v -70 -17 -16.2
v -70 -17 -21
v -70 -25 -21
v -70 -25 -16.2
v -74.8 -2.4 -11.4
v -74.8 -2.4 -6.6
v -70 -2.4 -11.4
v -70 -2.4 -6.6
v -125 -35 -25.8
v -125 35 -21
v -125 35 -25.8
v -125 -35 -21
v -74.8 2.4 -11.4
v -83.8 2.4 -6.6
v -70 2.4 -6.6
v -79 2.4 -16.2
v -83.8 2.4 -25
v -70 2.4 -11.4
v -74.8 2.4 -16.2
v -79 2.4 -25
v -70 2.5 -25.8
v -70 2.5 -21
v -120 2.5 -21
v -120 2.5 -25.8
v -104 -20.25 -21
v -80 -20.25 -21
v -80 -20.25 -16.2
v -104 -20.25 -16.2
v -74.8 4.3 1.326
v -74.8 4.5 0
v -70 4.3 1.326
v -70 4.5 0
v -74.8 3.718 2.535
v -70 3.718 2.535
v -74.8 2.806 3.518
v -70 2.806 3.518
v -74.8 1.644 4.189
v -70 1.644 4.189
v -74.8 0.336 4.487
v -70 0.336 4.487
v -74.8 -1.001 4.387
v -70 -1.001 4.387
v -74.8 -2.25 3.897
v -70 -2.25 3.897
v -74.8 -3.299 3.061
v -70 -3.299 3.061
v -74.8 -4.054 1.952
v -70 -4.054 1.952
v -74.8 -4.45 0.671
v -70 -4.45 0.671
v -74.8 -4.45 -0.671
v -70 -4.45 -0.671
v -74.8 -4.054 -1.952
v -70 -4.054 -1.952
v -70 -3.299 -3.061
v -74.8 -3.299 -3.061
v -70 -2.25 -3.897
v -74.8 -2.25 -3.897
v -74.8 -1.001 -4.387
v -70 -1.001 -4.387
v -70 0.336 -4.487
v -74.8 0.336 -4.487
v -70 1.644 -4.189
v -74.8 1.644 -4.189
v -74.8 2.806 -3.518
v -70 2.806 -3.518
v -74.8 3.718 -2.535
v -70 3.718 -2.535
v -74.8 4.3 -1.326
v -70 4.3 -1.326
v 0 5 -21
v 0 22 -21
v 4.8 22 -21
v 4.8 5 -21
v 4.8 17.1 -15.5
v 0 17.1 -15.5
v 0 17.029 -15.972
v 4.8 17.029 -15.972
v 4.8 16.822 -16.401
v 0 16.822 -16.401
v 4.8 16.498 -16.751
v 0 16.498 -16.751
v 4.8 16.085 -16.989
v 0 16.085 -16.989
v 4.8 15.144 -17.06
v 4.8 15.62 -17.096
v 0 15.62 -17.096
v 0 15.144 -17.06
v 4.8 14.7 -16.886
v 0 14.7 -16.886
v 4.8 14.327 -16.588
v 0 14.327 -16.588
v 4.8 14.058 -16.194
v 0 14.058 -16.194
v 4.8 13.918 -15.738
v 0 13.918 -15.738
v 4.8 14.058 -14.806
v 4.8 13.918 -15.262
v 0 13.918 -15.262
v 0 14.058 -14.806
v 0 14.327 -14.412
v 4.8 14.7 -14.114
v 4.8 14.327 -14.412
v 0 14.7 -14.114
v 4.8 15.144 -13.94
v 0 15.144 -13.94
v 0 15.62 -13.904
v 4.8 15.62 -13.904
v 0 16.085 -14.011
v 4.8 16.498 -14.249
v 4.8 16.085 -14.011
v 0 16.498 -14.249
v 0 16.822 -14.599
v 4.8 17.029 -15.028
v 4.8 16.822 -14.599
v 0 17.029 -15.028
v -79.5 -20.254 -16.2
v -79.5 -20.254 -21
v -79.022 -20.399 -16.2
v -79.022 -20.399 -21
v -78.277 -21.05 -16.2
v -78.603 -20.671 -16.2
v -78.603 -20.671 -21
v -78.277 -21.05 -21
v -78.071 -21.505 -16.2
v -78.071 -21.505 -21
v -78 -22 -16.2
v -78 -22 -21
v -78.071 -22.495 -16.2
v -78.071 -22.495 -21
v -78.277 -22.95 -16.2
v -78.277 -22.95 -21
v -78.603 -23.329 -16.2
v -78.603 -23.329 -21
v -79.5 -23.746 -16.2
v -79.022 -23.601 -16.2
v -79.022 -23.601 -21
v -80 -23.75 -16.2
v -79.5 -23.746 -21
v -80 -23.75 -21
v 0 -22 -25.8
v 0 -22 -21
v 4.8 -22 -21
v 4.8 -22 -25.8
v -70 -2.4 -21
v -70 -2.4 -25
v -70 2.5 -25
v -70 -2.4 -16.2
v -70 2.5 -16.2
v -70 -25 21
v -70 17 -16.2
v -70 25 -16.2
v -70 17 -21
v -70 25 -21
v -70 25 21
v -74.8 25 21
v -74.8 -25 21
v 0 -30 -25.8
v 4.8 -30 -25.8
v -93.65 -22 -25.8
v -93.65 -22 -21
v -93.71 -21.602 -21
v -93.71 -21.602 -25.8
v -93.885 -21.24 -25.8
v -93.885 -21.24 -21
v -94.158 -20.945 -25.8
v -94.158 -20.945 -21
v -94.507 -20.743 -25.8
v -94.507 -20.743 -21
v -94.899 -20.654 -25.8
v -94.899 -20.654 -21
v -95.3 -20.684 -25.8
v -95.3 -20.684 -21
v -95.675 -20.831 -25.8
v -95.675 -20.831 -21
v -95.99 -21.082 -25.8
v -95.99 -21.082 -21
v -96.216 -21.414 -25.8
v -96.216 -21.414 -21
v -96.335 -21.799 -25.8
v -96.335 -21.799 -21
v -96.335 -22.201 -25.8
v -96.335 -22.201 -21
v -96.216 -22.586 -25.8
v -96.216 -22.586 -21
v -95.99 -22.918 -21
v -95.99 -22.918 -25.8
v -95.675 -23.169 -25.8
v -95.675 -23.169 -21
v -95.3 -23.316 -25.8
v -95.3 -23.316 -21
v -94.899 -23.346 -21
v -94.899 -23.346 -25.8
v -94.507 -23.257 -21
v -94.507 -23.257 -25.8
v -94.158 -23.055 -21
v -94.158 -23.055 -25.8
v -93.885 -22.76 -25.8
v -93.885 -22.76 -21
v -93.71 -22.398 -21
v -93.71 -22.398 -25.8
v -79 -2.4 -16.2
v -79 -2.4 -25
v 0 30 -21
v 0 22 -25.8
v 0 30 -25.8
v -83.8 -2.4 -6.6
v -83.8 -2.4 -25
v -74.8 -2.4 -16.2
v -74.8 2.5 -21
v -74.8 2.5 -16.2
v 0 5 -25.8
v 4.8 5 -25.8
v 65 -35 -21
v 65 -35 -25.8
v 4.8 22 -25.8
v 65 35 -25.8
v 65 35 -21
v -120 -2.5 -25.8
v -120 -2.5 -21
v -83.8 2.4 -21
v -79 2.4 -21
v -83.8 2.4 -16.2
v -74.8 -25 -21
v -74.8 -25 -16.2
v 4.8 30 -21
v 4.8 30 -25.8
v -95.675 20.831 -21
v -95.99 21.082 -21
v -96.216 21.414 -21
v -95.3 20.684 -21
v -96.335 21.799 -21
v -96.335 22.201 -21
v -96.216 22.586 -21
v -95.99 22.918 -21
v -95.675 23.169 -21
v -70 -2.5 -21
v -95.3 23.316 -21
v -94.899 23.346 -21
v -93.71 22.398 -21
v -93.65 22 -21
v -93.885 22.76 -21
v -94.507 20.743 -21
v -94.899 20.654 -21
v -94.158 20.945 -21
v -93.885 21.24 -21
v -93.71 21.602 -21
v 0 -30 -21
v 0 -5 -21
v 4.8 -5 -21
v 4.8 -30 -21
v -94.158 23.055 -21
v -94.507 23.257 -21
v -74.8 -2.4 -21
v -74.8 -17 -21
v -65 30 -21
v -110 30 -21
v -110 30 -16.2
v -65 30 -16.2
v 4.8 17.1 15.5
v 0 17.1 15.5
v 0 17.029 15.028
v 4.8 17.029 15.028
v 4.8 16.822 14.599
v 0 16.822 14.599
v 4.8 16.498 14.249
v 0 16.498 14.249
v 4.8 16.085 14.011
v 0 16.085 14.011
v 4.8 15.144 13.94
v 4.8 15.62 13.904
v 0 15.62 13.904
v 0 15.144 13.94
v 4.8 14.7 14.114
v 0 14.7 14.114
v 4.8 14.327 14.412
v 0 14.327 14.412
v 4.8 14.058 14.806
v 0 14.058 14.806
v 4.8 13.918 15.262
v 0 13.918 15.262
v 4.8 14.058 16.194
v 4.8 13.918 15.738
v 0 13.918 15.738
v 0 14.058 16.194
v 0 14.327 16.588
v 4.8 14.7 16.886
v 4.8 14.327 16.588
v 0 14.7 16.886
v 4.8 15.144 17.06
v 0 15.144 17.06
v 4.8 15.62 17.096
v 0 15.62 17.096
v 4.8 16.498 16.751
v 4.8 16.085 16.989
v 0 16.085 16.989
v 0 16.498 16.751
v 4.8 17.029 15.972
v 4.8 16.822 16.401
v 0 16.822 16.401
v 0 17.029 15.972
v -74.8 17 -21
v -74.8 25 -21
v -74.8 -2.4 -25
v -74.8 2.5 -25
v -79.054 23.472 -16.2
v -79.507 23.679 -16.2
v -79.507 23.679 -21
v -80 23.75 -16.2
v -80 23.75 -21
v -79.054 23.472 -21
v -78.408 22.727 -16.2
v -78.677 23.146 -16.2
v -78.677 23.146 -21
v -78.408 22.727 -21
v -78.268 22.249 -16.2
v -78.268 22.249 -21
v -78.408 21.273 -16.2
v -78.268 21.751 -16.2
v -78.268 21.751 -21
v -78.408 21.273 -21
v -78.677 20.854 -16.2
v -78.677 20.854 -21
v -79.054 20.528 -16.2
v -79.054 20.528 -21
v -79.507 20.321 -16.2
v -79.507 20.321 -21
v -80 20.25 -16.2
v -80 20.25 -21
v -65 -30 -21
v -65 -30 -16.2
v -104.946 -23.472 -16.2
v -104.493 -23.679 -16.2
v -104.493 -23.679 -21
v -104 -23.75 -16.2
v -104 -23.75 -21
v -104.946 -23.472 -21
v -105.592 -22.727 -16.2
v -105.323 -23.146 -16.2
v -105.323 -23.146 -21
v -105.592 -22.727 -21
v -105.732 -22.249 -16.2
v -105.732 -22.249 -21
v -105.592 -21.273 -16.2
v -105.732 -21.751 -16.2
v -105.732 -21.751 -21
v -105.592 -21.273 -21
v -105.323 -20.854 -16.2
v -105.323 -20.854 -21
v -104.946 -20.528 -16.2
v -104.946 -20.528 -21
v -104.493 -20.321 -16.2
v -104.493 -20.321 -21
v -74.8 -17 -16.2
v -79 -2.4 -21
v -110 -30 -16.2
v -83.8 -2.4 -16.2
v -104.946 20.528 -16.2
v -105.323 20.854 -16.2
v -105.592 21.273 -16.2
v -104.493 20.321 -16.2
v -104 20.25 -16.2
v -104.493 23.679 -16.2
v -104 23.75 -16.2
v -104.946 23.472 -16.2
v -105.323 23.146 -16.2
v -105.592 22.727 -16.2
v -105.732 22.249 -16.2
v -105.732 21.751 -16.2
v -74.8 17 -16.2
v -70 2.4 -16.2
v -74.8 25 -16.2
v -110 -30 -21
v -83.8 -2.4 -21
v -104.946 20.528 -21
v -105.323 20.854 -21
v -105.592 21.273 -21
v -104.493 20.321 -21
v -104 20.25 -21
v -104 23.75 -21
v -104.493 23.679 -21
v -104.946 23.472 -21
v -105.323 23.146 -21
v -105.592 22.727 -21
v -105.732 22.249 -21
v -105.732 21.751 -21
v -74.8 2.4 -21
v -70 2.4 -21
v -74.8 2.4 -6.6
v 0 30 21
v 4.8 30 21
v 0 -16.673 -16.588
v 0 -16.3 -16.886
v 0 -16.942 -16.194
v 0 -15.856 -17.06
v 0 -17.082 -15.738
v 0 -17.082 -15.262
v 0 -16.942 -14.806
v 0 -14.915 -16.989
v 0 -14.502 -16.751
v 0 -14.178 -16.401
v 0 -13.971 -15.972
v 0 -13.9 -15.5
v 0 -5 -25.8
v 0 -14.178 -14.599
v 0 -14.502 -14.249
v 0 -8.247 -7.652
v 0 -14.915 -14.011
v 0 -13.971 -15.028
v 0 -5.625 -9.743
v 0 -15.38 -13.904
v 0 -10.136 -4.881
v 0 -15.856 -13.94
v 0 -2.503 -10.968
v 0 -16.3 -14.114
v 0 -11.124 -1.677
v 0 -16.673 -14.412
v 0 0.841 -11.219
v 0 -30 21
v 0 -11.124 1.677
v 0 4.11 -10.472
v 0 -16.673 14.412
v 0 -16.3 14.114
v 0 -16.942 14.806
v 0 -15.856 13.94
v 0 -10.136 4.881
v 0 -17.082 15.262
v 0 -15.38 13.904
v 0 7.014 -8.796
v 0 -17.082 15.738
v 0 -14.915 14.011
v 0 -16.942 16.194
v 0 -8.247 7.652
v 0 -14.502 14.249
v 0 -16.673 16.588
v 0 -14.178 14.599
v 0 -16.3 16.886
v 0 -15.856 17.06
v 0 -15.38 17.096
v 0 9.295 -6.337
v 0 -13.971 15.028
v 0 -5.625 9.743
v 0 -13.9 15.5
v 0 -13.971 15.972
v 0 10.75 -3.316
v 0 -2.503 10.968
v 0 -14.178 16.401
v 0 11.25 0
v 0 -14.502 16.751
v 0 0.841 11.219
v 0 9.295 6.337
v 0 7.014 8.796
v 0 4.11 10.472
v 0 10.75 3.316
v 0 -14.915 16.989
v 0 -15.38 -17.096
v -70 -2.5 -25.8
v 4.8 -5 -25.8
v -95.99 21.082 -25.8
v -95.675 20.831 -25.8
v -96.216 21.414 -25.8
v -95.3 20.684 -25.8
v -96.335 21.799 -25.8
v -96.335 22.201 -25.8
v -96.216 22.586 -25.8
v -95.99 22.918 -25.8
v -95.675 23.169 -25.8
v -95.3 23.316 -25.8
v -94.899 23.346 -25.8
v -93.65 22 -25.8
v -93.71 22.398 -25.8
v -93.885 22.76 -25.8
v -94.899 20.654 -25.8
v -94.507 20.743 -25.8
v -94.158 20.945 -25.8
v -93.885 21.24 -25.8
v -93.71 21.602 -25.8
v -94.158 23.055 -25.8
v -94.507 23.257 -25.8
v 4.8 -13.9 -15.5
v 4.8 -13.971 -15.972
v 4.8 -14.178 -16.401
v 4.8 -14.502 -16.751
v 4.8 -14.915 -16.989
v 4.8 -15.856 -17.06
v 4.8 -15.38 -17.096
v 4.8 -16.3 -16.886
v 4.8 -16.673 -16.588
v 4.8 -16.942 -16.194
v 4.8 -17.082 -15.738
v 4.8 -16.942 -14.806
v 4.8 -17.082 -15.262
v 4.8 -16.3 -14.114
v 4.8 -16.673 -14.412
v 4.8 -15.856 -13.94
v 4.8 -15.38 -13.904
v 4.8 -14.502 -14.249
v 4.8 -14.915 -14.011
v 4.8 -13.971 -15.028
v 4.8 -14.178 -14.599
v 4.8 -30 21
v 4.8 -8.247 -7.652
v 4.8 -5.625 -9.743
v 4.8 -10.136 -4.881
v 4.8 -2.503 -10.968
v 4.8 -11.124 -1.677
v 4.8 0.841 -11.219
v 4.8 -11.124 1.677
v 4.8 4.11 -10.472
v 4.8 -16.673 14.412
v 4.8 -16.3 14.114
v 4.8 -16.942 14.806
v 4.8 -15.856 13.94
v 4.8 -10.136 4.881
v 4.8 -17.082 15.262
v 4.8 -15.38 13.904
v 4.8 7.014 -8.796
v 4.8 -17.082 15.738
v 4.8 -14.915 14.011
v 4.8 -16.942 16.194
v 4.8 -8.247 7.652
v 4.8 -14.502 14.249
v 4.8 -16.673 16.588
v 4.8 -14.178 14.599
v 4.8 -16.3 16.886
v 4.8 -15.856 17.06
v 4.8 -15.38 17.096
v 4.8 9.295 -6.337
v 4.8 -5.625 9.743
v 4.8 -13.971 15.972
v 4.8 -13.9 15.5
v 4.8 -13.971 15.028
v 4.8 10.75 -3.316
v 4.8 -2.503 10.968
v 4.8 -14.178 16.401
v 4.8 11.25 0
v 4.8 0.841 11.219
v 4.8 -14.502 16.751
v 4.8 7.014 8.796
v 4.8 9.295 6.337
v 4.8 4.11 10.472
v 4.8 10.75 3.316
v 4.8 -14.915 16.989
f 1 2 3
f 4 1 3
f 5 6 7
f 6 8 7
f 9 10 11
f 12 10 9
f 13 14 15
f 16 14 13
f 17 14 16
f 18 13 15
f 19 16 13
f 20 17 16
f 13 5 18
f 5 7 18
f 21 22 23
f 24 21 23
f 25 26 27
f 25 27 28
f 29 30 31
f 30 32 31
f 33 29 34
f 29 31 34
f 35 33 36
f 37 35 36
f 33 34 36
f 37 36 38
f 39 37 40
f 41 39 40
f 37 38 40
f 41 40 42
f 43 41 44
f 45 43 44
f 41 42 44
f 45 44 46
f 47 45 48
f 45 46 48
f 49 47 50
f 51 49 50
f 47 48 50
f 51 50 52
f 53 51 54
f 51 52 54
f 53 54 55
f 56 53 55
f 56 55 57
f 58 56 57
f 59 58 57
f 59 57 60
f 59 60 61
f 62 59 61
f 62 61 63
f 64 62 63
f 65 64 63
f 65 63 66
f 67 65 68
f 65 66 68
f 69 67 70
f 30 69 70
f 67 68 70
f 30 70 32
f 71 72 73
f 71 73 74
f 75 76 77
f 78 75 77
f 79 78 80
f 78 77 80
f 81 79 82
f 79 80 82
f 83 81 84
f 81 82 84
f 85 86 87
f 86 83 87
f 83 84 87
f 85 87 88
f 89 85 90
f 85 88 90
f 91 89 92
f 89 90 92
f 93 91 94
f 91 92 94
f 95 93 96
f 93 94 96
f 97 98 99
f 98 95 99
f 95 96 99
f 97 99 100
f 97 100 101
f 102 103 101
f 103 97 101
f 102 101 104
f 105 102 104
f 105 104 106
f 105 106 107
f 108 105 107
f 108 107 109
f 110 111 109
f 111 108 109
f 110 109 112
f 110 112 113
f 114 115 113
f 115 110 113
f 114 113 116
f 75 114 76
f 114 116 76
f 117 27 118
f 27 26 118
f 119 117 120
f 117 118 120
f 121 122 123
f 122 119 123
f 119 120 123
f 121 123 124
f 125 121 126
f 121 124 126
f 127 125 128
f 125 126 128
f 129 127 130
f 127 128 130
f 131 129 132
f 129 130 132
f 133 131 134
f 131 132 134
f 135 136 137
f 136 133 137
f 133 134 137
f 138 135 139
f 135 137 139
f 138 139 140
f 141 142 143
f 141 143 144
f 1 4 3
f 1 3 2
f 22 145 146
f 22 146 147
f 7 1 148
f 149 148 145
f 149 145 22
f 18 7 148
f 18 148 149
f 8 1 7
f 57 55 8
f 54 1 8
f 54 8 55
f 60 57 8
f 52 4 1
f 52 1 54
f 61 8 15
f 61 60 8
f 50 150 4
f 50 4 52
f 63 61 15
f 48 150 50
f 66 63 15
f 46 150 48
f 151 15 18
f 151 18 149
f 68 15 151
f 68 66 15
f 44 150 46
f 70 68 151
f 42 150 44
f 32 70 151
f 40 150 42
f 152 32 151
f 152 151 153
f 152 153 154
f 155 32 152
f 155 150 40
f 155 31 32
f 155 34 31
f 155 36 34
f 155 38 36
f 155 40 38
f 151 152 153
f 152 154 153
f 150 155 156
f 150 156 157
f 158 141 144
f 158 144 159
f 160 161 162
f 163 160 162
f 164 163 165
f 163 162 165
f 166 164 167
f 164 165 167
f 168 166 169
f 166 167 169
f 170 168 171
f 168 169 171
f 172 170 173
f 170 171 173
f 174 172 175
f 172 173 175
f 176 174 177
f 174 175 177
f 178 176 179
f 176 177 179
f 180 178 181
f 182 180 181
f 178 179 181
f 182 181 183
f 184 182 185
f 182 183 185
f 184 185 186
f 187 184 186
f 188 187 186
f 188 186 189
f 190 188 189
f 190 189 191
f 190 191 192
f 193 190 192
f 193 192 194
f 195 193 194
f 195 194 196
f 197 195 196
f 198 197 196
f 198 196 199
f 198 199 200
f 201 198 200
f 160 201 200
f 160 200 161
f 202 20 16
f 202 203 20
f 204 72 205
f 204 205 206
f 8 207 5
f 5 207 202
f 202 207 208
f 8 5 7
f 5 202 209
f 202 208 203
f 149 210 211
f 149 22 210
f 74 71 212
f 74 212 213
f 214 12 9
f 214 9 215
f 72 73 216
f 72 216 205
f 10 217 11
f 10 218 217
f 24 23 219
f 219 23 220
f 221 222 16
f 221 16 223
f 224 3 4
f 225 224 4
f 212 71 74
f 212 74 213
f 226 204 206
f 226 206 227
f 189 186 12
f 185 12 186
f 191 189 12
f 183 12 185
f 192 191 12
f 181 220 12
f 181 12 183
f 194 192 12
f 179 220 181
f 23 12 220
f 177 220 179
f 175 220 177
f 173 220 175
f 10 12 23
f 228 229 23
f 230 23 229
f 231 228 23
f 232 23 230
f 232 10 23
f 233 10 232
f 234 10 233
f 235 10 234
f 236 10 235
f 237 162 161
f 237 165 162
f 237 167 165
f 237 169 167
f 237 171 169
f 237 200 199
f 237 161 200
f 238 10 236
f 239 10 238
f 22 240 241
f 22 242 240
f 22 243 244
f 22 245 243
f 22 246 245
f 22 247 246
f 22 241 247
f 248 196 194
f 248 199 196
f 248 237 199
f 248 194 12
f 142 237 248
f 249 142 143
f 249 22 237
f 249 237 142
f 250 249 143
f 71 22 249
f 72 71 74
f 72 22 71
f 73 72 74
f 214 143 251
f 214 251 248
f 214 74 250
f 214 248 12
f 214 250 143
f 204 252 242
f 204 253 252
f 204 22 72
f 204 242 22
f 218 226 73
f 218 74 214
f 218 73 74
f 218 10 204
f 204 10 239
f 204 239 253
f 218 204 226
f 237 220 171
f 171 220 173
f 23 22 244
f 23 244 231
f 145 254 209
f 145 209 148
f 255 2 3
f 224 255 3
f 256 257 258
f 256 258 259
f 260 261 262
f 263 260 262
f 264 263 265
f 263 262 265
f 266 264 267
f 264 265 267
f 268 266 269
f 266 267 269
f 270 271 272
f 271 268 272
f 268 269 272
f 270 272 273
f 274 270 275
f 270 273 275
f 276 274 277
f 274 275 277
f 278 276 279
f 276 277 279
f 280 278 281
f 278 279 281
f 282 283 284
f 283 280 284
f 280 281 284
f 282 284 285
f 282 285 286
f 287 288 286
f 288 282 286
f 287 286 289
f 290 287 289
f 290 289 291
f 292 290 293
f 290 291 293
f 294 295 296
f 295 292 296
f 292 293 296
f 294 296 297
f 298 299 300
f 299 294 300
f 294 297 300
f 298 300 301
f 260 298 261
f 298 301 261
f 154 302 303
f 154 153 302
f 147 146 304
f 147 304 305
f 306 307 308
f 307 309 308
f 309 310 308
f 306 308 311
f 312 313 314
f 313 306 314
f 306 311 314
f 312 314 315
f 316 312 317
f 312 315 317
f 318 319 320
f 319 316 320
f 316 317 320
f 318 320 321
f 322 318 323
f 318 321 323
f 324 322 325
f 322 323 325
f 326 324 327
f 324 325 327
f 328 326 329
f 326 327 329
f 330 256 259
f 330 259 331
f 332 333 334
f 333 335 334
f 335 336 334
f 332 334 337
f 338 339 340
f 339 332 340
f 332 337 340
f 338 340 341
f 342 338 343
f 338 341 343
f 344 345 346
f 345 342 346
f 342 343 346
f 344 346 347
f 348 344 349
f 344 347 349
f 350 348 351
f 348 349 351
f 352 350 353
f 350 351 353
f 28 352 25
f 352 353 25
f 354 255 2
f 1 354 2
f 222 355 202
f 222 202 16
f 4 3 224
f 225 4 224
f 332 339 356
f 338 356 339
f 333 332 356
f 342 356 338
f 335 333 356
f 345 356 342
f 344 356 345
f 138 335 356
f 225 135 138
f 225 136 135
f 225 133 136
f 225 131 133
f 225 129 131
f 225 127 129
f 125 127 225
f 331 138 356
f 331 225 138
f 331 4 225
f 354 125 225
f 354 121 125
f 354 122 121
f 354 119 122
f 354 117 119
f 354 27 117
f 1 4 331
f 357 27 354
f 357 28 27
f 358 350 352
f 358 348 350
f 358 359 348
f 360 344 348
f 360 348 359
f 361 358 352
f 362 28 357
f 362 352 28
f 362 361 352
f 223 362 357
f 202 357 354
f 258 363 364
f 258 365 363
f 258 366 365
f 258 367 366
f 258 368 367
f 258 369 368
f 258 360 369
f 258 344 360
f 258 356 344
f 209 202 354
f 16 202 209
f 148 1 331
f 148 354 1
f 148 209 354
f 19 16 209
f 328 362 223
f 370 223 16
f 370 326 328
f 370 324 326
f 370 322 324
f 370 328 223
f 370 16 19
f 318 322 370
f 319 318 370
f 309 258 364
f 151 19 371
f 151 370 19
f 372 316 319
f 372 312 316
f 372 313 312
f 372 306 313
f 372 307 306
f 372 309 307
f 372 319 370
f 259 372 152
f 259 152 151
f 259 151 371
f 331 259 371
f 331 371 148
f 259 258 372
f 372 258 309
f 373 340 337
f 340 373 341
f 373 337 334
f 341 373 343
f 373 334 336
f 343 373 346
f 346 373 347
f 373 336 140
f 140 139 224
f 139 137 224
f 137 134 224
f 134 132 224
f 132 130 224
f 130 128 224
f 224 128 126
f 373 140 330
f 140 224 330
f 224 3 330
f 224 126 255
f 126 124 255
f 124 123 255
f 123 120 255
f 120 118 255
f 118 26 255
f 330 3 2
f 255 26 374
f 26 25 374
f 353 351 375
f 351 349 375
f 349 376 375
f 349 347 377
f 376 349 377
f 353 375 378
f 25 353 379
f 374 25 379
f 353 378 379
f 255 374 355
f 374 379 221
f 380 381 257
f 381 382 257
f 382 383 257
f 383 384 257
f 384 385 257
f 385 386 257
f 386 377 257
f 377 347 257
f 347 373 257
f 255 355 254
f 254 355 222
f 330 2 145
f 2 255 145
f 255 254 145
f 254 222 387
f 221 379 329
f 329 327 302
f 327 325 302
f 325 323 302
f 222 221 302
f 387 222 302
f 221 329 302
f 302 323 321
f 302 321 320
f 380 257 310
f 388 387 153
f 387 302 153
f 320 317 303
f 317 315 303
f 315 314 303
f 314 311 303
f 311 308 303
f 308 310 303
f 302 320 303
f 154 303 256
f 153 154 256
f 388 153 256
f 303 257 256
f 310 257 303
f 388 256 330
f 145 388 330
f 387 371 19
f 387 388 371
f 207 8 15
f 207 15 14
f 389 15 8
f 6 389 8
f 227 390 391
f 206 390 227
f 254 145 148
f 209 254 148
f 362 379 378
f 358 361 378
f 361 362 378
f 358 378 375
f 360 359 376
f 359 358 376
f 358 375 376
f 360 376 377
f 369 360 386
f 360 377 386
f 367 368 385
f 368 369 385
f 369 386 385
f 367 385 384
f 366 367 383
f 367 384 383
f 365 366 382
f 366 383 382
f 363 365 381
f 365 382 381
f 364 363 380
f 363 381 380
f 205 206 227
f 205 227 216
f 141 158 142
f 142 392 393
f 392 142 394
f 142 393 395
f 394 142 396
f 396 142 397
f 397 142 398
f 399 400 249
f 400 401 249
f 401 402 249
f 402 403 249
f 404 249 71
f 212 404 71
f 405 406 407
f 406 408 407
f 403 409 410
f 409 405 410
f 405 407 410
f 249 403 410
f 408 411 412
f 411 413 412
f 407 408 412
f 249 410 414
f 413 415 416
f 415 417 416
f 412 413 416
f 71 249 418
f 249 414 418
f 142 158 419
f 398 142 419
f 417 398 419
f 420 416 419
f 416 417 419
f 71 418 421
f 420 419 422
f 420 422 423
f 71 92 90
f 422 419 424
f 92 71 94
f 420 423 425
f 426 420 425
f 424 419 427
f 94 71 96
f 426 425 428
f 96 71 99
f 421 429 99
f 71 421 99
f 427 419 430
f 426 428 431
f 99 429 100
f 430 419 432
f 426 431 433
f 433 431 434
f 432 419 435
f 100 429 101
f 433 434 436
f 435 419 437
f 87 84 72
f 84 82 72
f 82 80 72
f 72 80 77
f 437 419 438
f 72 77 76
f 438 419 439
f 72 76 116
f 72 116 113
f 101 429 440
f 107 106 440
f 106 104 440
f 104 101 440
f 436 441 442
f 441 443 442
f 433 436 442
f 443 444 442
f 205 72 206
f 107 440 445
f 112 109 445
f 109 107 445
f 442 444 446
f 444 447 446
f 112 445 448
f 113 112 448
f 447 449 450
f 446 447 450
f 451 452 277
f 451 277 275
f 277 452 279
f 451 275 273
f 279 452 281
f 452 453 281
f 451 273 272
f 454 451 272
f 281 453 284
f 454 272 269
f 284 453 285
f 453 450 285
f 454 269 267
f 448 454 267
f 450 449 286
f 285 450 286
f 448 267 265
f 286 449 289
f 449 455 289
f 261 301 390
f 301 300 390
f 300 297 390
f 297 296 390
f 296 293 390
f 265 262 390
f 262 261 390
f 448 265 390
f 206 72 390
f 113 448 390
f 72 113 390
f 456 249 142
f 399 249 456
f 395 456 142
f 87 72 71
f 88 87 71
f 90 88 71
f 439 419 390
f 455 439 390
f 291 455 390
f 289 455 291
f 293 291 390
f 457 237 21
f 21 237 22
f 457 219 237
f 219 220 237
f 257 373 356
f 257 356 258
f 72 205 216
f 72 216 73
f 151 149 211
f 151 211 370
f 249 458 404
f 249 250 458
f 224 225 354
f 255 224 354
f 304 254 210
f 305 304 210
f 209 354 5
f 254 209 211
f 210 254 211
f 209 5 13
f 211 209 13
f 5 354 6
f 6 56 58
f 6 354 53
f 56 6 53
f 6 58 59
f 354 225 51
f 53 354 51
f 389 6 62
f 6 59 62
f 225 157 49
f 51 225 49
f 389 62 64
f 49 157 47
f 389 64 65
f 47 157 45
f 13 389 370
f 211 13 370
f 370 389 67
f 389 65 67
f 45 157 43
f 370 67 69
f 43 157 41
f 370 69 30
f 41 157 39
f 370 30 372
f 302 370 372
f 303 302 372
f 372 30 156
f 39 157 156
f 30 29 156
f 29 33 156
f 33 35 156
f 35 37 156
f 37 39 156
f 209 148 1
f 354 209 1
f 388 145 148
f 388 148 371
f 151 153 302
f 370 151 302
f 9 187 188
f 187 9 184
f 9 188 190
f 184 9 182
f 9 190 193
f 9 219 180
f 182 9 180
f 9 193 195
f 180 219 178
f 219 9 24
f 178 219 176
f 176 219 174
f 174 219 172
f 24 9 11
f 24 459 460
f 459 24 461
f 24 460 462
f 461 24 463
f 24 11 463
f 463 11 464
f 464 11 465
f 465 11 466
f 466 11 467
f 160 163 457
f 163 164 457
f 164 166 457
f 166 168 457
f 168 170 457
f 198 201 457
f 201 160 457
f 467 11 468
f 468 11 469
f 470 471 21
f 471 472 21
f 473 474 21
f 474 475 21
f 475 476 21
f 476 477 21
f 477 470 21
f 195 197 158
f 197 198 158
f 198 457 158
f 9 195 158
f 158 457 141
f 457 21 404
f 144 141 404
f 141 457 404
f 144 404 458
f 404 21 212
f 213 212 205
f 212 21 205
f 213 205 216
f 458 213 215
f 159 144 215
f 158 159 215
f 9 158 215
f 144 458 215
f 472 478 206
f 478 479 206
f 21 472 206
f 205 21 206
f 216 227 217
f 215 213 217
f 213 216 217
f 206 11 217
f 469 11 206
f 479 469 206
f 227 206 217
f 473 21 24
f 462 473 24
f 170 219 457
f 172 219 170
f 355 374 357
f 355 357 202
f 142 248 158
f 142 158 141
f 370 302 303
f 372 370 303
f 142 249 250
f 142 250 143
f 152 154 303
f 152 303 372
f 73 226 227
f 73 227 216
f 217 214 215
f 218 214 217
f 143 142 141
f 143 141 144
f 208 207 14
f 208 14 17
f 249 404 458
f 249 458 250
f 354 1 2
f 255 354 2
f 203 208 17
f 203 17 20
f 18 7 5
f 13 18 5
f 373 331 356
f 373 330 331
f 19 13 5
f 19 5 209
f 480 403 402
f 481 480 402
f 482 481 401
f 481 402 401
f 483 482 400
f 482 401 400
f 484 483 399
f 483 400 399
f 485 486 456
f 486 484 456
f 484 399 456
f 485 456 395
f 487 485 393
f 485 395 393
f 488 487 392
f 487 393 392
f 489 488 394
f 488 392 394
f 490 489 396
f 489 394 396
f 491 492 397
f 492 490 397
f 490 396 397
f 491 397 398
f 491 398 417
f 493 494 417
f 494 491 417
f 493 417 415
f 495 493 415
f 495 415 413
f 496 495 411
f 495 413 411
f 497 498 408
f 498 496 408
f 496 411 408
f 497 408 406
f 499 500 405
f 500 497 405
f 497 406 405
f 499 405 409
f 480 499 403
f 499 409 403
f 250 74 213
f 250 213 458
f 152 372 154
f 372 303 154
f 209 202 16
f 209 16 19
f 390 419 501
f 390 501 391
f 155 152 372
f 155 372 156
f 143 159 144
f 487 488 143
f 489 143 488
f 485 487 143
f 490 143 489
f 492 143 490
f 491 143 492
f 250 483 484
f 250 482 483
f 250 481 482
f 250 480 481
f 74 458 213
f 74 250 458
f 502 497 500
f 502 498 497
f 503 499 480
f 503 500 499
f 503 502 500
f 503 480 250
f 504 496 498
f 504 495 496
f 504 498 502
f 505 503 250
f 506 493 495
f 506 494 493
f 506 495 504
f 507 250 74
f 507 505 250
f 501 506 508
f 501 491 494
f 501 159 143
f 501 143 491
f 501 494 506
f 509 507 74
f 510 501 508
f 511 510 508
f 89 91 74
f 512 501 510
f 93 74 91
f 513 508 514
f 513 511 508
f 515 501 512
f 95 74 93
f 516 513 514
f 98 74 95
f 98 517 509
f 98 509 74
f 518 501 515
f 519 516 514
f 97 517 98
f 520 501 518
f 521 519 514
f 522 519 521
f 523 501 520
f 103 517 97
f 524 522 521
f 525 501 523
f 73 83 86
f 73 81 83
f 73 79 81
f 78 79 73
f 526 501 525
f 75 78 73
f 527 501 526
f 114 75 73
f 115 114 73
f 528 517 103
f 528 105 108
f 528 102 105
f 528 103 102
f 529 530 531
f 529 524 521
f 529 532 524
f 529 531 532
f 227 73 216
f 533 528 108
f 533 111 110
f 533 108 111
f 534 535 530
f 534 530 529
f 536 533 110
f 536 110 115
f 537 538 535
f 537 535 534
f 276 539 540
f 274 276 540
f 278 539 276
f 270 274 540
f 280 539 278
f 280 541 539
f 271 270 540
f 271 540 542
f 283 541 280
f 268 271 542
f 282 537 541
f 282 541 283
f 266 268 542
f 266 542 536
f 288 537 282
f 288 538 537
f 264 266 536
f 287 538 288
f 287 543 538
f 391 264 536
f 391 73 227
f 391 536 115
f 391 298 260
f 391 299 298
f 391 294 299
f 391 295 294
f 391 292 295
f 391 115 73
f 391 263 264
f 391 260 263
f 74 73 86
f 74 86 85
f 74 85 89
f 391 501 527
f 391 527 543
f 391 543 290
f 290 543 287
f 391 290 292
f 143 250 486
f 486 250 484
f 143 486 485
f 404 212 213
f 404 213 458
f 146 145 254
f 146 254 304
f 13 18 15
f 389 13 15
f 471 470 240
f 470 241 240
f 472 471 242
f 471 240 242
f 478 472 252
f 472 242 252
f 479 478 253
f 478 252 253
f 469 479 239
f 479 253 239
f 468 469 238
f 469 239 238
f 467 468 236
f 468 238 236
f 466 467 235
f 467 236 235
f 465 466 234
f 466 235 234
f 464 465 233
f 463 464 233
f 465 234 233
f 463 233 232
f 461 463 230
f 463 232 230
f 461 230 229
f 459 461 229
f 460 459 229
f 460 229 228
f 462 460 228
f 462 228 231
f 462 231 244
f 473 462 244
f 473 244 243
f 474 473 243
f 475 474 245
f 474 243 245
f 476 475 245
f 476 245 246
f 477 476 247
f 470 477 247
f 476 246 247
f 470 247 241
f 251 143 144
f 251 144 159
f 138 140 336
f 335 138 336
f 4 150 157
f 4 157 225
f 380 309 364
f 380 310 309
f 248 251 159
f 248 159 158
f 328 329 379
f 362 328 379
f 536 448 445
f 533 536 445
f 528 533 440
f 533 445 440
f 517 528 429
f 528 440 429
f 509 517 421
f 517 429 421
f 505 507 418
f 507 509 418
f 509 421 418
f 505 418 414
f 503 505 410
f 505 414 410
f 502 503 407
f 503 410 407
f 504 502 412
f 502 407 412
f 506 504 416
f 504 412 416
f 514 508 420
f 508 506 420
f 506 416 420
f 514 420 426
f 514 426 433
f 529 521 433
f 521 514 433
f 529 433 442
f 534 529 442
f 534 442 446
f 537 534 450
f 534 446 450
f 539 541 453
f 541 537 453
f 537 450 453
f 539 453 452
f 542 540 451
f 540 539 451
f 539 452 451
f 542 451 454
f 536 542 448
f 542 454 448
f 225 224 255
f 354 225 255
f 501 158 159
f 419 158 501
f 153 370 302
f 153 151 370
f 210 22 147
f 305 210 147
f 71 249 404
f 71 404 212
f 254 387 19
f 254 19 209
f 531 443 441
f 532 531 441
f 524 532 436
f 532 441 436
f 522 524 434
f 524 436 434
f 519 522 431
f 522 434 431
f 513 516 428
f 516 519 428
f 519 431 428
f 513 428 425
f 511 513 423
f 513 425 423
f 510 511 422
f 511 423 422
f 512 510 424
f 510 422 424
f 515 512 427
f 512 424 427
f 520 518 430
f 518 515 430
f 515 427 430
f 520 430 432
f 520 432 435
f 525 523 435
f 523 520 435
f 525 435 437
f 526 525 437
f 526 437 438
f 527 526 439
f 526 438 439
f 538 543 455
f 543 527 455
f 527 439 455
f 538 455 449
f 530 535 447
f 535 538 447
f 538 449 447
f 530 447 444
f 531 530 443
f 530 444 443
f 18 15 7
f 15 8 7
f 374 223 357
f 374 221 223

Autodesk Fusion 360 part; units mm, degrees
ref_plane "WorkPlane1" through (0, 0, -21) normal (0, 0, 1) x (1, 0, 0)
ref_plane "WorkPlane2" through (-70, 0, 0) normal (1, 0, 0) x (0, 1, 0)
sketch "nema17_dimensions" plane through (0, 0, 0) normal (1, 0, 0) x (0, 1, 0)
  line L0 (15.5, 15.5) -> (-15.5, 15.5) construction
  line L1 (-15.5, 15.5) -> (-15.5, -15.5) construction
  line L2 (-15.5, -15.5) -> (15.5, -15.5) construction
  line L3 (15.5, -15.5) -> (15.5, 15.5) construction
  line L4 (15.5, 15.5) -> (-15.5, -15.5) construction
  line L5 (-15.5, 15.5) -> (15.5, -15.5) construction
  line L6 (21, 21) -> (-21, 21) construction
  line L7 (-21, 21) -> (-21, -21) construction
  line L8 (-21, -21) -> (21, -21) construction
  line L9 (21, -21) -> (21, 21) construction
  line L10 (21, 21) -> (-21, -21) construction
  line L11 (-21, 21) -> (21, -21) construction
  dimension "d1" = 31
  dimension "d2" = 31
  dimension "d3" = 42
sketch "motor_face" plane through (0, 0, 0) normal (1, 0, 0) x (0, 1, 0)
  circle A0 centre (0, 0) radius 11.25
  circle A1 centre (-15.5, 15.5) radius 1.6
  circle A2 centre (15.5, 15.5) radius 1.6
  circle A3 centre (15.5, -15.5) radius 1.6
  circle A4 centre (-15.5, -15.5) radius 1.6
  line L0 (-30, 21) -> (30, 21)
  line L1 (30, 21) -> (30, -25.8)
  line L2 (30, -25.8) -> (22, -25.8)
  line L3 (22, -25.8) -> (22, -21)
  line L4 (22, -21) -> (5, -21)
  line L5 (5, -21) -> (5, -25.8)
  line L6 (5, -25.8) -> (-5, -25.8)
  line L7 (-5, -25.8) -> (-5, -21)
  line L8 (-5, -21) -> (-22, -21)
  line L9 (-22, -21) -> (-22, -25.8)
  line L10 (-22, -25.8) -> (-30, -25.8)
  line L11 (-30, -25.8) -> (-30, 21)
  point P0 (15.5, 15.5)
  point P1 (-15.5, 15.5)
  point P2 (-15.5, -15.5)
  point P3 (15.5, -15.5)
  dimension "d4" = 22.5
  dimension "d5" = 3.2
  dimension "d6" = 3.2
  dimension "d7" = 3.2
  dimension "d8" = 3.2
  dimension "d9" = 46.8
  dimension "d15" = 60
sketch "base_dimensions" plane through (0, 0, -21) normal (0, 0, 1) x (1, 0, 0)
  line L0 (0, -21) -> (42, -21)
  line L1 (42, -21) -> (42, 21)
  line L2 (42, 21) -> (0, 21)
  line L3 (0, 21) -> (0, -21)
  line L4 (0, -1.5) -> (-12, -1.5)
  line L5 (-12, -1.5) -> (-12, -5)
  line L6 (-12, -5) -> (-32, -5)
  line L7 (-32, -5) -> (-32, 5)
  line L8 (-32, 5) -> (-12, 5)
  line L9 (-12, 5) -> (-12, 1.5)
  line L10 (-12, 1.5) -> (0, 1.5)
  line L11 (-40, -20) -> (-40, 20) construction
  line L12 (-40, -20) -> (-44, -14) construction
  line L13 (-44, -14) -> (-44, 14) construction
  line L14 (-44, 14) -> (-40, 20) construction
  line L15 (-44, -1.5) -> (-49, -1.5) construction
  line L16 (-44, 1.5) -> (-49, 1.5) construction
  line L17 (-49, 1.5) -> (-49, -1.5) construction
  line L18 (-49, -14) -> (-53, -20) construction
  line L19 (-53, -20) -> (-53, 20) construction
  line L20 (-53, 20) -> (-49, 14) construction
  line L21 (-49, 14) -> (-49, -14) construction
  dimension "d16" = 42
  dimension "d17" = 42
sketch "base" plane through (0, 0, -21) normal (0, 0, 1) x (1, 0, 0)
  line L0 (0, 30) -> (4.8, 30)
  line L1 (4.8, 30) -> (4.8, 22)
  line L2 (4.8, 22) -> (0, 22)
  line L3 (0, 22) -> (0, 30)
  line L4 (0, 5) -> (4.8, 5)
  line L5 (4.8, 5) -> (4.8, -5)
  line L6 (4.8, -5) -> (0, -5)
  line L7 (0, -5) -> (0, 5)
  line L8 (0, -22) -> (4.8, -22)
  line L9 (4.8, -22) -> (4.8, -30)
  line L10 (4.8, -30) -> (0, -30)
  line L11 (0, -30) -> (0, -22)
  line L12 (65, 35) -> (-125, 35)
  line L13 (-125, 35) -> (-125, -35)
  line L14 (-125, -35) -> (65, -35)
  line L15 (65, -35) -> (65, 35)
  line L16 (-70, 2.5) -> (-120, 2.5)
  line L17 (-120, 2.5) -> (-120, -2.5)
  line L18 (-120, -2.5) -> (-70, -2.5)
  line L19 (-70, -2.5) -> (-70, 2.5)
  circle A0 centre (-95, -22) radius 1.35
  circle A1 centre (-95, 22) radius 1.35
  point P0 (0, 30)
  point P1 (0, 22)
  point P2 (0, 5)
  point P3 (0, -5)
  point P4 (0, -22)
  point P5 (0, -30)
  point P6 (-95, 0)
  point P7 (-95, 22)
  point P8 (-95, -22)
  dimension "d12" = 4.8
  dimension "d13" = 4.8
  dimension "d14" = 4.8
  dimension "d18" = 50
  dimension "d19" = 5
  dimension "d34" = 2.7
  dimension "d35" = 2.7
sketch "slider_base" plane through (0, 0, -21) normal (0, 0, 1) x (1, 0, 0)
  line L0 (-65, -30) -> (-110, -30)
  line L1 (-110, -30) -> (-110, 30)
  line L2 (-110, 30) -> (-65, 30)
  line L3 (-65, 30) -> (-65, -30)
  line L4 (-70, -25) -> (-74.8, -25)
  line L5 (-74.8, -25) -> (-74.8, -17)
  line L6 (-74.8, -17) -> (-70, -17)
  line L7 (-70, -17) -> (-70, -25)
  line L8 (-70, 25) -> (-70, 17)
  line L9 (-70, 17) -> (-74.8, 17)
  line L10 (-74.8, 17) -> (-74.8, 25)
  line L11 (-74.8, 25) -> (-70, 25)
  line L12 (-70, -17) -> (-70, -25)
  line L13 (-70, -25) -> (-74.8, -25)
  line L14 (-74.8, -25) -> (-74.8, -17)
  line L15 (-74.8, -17) -> (-70, -17)
  line L16 (-70, 2.4) -> (-74.8, 2.4)
  line L17 (-74.8, 2.4) -> (-74.8, -2.4)
  line L18 (-74.8, -2.4) -> (-70, -2.4)
  line L19 (-70, -2.4) -> (-70, 2.4)
  line L20 (-79, -2.4) -> (-79, 2.4)
  line L21 (-79, 2.4) -> (-83.8, 2.4)
  line L22 (-83.8, 2.4) -> (-83.8, -2.4)
  line L23 (-83.8, -2.4) -> (-79, -2.4)
  line L24 (-80, -23.75) -> (-104, -23.75)
  line L25 (-80, -20.25) -> (-104, -20.25)
  line L26 (-80, 20.25) -> (-104, 20.25)
  line L27 (-80, 23.75) -> (-104, 23.75)
  arc A0 (-80, -23.75) -> (-80, -20.25) centre (-79.7656, -22) ccw
  arc A1 (-104, -20.25) -> (-104, -23.75) centre (-104, -22) ccw
  arc A2 (-80, 20.25) -> (-80, 23.75) centre (-80, 22) ccw
  arc A3 (-104, 23.75) -> (-104, 20.25) centre (-104, 22) ccw
  point P0 (-72.4, 0)
  point P1 (-95, -22)
  point P2 (-95, 22)
  dimension "d20" = 4.8
  dimension "d21" = 8
  dimension "d22" = 4.8
  dimension "d23" = 8
  dimension "d24" = 4.8
  dimension "d25" = 8
  dimension "d26" = 4.8
  dimension "d27" = 4.8
  dimension "d28" = 4.8
  dimension "d29" = 4.8
sketch "slider_face" plane through (-70, 0, 0) normal (1, 0, 0) x (0, 1, 0)
  line L0 (2.5, -21) -> (2.5, -25)
  line L1 (-2.4, -21) -> (-2.4, -25)
  line L2 (-2.4, -25) -> (2.5, -25)
  line L3 (2.5, -21) -> (2.5, -16.2)
  line L4 (2.5, -16.2) -> (17, -16.2)
  line L5 (17, -16.2) -> (17, -21)
  line L6 (17, -21) -> (25, -21)
  line L7 (25, -21) -> (25, -16.2)
  line L8 (-2.4, -21) -> (-2.4, -16.2)
  line L9 (-2.4, -16.2) -> (-17, -16.2)
  line L10 (-17, -16.2) -> (-17, -21)
  line L11 (-17, -21) -> (-25, -21)
  line L12 (-25, -21) -> (-25, -16.2)
  line L13 (25, -16.2) -> (25, 21)
  line L14 (25, 21) -> (-25, 21)
  line L15 (-25, 21) -> (-25, -16.2)
  circle A0 centre (0, 0) radius 4.5
  line L16 (-2.4, -11.4) -> (2.4, -11.4)
  line L17 (2.4, -11.4) -> (2.4, -6.6)
  line L18 (2.4, -6.6) -> (-2.4, -6.6)
  line L19 (-2.4, -6.6) -> (-2.4, -11.4)
  point P0 (25, -21)
  point P1 (17, -21)
  point P2 (2.5, -21)
  point P3 (-2.4, -21)
  point P4 (-17, -21)
  point P5 (-25, -21)
  point P6 (0, -9)
  dimension "d37" = 4.8
  dimension "d38" = 9
  dimension "d40" = 4.8
  dimension "d41" = 4.8
sketch "lock_piece" plane through (0, 0, 0) normal (0, 1, 0) x (1, 0, 0)
  line L0 (-70, 6.6) -> (-83.8, 6.6)
  line L1 (-83.8, 6.6) -> (-83.8, 21)
  line L2 (-83.8, 21) -> (-83.8, 25)
  line L3 (-83.8, 25) -> (-79, 25)
  line L4 (-79, 25) -> (-79, 21)
  line L5 (-79, 21) -> (-79, 16.2)
  line L6 (-70, 16.2) -> (-70, 11.4)
  line L7 (-70, 11.4) -> (-74.8, 11.4)
  line L8 (-74.8, 11.4) -> (-74.8, 16.2)
  line L9 (-79, 16.2) -> (-74.8, 16.2)
  line L10 (-70, 6.6) -> (-70, 11.4)
  point P0 (-70, 6.6)
  point P1 (-70, 11.4)
  point P2 (-70, 16.2)
  point P3 (-79, 21)
  point P4 (-83.8, 21)
  dimension "d42" = 4
  dimension "d43" = 4.8
extrude "Extrude1" add sketch "base" against normal blind 4.8 makes body 1
extrude "Extrude2" add sketch "motor_face" along normal blind 4.8 separate body makes body 2
extrude "Extrude3" add sketch "slider_base" along normal blind 4.8 separate body makes body 3
extrude "Extrude4" add sketch "slider_face" against normal blind 4.8 separate body makes body 4
extrude "Extrude5" add sketch "lock_piece" along normal mid plane 4.8 separate body makes body 5
equation "ply_medium = 4.8 mm"
equation "d12 = ply_medium"
equation "d13 = ply_medium"
equation "d14 = ply_medium"
equation "d19 = ply_medium + 0.2 mm"
equation "d20 = ply_medium"
equation "d22 = ply_medium"
equation "d24 = ply_medium"
equation "d26 = ply_medium"
equation "d27 = ply_medium"
equation "d28 = ply_medium"
equation "d29 = ply_medium"
equation "d37 = ply_medium"
equation "d38 = tiny_bearing_od"
equation "tiny_bearing_od = 9 mm"
equation "d40 = ply_medium"
equation "d41 = ply_medium"
equation "d43 = ply_medium"
equation "d44 = -ply_medium"
equation "d46 = ply_medium"
equation "d48 = ply_medium"
equation "d50 = -ply_medium"
equation "d52 = ply_medium / 2"
